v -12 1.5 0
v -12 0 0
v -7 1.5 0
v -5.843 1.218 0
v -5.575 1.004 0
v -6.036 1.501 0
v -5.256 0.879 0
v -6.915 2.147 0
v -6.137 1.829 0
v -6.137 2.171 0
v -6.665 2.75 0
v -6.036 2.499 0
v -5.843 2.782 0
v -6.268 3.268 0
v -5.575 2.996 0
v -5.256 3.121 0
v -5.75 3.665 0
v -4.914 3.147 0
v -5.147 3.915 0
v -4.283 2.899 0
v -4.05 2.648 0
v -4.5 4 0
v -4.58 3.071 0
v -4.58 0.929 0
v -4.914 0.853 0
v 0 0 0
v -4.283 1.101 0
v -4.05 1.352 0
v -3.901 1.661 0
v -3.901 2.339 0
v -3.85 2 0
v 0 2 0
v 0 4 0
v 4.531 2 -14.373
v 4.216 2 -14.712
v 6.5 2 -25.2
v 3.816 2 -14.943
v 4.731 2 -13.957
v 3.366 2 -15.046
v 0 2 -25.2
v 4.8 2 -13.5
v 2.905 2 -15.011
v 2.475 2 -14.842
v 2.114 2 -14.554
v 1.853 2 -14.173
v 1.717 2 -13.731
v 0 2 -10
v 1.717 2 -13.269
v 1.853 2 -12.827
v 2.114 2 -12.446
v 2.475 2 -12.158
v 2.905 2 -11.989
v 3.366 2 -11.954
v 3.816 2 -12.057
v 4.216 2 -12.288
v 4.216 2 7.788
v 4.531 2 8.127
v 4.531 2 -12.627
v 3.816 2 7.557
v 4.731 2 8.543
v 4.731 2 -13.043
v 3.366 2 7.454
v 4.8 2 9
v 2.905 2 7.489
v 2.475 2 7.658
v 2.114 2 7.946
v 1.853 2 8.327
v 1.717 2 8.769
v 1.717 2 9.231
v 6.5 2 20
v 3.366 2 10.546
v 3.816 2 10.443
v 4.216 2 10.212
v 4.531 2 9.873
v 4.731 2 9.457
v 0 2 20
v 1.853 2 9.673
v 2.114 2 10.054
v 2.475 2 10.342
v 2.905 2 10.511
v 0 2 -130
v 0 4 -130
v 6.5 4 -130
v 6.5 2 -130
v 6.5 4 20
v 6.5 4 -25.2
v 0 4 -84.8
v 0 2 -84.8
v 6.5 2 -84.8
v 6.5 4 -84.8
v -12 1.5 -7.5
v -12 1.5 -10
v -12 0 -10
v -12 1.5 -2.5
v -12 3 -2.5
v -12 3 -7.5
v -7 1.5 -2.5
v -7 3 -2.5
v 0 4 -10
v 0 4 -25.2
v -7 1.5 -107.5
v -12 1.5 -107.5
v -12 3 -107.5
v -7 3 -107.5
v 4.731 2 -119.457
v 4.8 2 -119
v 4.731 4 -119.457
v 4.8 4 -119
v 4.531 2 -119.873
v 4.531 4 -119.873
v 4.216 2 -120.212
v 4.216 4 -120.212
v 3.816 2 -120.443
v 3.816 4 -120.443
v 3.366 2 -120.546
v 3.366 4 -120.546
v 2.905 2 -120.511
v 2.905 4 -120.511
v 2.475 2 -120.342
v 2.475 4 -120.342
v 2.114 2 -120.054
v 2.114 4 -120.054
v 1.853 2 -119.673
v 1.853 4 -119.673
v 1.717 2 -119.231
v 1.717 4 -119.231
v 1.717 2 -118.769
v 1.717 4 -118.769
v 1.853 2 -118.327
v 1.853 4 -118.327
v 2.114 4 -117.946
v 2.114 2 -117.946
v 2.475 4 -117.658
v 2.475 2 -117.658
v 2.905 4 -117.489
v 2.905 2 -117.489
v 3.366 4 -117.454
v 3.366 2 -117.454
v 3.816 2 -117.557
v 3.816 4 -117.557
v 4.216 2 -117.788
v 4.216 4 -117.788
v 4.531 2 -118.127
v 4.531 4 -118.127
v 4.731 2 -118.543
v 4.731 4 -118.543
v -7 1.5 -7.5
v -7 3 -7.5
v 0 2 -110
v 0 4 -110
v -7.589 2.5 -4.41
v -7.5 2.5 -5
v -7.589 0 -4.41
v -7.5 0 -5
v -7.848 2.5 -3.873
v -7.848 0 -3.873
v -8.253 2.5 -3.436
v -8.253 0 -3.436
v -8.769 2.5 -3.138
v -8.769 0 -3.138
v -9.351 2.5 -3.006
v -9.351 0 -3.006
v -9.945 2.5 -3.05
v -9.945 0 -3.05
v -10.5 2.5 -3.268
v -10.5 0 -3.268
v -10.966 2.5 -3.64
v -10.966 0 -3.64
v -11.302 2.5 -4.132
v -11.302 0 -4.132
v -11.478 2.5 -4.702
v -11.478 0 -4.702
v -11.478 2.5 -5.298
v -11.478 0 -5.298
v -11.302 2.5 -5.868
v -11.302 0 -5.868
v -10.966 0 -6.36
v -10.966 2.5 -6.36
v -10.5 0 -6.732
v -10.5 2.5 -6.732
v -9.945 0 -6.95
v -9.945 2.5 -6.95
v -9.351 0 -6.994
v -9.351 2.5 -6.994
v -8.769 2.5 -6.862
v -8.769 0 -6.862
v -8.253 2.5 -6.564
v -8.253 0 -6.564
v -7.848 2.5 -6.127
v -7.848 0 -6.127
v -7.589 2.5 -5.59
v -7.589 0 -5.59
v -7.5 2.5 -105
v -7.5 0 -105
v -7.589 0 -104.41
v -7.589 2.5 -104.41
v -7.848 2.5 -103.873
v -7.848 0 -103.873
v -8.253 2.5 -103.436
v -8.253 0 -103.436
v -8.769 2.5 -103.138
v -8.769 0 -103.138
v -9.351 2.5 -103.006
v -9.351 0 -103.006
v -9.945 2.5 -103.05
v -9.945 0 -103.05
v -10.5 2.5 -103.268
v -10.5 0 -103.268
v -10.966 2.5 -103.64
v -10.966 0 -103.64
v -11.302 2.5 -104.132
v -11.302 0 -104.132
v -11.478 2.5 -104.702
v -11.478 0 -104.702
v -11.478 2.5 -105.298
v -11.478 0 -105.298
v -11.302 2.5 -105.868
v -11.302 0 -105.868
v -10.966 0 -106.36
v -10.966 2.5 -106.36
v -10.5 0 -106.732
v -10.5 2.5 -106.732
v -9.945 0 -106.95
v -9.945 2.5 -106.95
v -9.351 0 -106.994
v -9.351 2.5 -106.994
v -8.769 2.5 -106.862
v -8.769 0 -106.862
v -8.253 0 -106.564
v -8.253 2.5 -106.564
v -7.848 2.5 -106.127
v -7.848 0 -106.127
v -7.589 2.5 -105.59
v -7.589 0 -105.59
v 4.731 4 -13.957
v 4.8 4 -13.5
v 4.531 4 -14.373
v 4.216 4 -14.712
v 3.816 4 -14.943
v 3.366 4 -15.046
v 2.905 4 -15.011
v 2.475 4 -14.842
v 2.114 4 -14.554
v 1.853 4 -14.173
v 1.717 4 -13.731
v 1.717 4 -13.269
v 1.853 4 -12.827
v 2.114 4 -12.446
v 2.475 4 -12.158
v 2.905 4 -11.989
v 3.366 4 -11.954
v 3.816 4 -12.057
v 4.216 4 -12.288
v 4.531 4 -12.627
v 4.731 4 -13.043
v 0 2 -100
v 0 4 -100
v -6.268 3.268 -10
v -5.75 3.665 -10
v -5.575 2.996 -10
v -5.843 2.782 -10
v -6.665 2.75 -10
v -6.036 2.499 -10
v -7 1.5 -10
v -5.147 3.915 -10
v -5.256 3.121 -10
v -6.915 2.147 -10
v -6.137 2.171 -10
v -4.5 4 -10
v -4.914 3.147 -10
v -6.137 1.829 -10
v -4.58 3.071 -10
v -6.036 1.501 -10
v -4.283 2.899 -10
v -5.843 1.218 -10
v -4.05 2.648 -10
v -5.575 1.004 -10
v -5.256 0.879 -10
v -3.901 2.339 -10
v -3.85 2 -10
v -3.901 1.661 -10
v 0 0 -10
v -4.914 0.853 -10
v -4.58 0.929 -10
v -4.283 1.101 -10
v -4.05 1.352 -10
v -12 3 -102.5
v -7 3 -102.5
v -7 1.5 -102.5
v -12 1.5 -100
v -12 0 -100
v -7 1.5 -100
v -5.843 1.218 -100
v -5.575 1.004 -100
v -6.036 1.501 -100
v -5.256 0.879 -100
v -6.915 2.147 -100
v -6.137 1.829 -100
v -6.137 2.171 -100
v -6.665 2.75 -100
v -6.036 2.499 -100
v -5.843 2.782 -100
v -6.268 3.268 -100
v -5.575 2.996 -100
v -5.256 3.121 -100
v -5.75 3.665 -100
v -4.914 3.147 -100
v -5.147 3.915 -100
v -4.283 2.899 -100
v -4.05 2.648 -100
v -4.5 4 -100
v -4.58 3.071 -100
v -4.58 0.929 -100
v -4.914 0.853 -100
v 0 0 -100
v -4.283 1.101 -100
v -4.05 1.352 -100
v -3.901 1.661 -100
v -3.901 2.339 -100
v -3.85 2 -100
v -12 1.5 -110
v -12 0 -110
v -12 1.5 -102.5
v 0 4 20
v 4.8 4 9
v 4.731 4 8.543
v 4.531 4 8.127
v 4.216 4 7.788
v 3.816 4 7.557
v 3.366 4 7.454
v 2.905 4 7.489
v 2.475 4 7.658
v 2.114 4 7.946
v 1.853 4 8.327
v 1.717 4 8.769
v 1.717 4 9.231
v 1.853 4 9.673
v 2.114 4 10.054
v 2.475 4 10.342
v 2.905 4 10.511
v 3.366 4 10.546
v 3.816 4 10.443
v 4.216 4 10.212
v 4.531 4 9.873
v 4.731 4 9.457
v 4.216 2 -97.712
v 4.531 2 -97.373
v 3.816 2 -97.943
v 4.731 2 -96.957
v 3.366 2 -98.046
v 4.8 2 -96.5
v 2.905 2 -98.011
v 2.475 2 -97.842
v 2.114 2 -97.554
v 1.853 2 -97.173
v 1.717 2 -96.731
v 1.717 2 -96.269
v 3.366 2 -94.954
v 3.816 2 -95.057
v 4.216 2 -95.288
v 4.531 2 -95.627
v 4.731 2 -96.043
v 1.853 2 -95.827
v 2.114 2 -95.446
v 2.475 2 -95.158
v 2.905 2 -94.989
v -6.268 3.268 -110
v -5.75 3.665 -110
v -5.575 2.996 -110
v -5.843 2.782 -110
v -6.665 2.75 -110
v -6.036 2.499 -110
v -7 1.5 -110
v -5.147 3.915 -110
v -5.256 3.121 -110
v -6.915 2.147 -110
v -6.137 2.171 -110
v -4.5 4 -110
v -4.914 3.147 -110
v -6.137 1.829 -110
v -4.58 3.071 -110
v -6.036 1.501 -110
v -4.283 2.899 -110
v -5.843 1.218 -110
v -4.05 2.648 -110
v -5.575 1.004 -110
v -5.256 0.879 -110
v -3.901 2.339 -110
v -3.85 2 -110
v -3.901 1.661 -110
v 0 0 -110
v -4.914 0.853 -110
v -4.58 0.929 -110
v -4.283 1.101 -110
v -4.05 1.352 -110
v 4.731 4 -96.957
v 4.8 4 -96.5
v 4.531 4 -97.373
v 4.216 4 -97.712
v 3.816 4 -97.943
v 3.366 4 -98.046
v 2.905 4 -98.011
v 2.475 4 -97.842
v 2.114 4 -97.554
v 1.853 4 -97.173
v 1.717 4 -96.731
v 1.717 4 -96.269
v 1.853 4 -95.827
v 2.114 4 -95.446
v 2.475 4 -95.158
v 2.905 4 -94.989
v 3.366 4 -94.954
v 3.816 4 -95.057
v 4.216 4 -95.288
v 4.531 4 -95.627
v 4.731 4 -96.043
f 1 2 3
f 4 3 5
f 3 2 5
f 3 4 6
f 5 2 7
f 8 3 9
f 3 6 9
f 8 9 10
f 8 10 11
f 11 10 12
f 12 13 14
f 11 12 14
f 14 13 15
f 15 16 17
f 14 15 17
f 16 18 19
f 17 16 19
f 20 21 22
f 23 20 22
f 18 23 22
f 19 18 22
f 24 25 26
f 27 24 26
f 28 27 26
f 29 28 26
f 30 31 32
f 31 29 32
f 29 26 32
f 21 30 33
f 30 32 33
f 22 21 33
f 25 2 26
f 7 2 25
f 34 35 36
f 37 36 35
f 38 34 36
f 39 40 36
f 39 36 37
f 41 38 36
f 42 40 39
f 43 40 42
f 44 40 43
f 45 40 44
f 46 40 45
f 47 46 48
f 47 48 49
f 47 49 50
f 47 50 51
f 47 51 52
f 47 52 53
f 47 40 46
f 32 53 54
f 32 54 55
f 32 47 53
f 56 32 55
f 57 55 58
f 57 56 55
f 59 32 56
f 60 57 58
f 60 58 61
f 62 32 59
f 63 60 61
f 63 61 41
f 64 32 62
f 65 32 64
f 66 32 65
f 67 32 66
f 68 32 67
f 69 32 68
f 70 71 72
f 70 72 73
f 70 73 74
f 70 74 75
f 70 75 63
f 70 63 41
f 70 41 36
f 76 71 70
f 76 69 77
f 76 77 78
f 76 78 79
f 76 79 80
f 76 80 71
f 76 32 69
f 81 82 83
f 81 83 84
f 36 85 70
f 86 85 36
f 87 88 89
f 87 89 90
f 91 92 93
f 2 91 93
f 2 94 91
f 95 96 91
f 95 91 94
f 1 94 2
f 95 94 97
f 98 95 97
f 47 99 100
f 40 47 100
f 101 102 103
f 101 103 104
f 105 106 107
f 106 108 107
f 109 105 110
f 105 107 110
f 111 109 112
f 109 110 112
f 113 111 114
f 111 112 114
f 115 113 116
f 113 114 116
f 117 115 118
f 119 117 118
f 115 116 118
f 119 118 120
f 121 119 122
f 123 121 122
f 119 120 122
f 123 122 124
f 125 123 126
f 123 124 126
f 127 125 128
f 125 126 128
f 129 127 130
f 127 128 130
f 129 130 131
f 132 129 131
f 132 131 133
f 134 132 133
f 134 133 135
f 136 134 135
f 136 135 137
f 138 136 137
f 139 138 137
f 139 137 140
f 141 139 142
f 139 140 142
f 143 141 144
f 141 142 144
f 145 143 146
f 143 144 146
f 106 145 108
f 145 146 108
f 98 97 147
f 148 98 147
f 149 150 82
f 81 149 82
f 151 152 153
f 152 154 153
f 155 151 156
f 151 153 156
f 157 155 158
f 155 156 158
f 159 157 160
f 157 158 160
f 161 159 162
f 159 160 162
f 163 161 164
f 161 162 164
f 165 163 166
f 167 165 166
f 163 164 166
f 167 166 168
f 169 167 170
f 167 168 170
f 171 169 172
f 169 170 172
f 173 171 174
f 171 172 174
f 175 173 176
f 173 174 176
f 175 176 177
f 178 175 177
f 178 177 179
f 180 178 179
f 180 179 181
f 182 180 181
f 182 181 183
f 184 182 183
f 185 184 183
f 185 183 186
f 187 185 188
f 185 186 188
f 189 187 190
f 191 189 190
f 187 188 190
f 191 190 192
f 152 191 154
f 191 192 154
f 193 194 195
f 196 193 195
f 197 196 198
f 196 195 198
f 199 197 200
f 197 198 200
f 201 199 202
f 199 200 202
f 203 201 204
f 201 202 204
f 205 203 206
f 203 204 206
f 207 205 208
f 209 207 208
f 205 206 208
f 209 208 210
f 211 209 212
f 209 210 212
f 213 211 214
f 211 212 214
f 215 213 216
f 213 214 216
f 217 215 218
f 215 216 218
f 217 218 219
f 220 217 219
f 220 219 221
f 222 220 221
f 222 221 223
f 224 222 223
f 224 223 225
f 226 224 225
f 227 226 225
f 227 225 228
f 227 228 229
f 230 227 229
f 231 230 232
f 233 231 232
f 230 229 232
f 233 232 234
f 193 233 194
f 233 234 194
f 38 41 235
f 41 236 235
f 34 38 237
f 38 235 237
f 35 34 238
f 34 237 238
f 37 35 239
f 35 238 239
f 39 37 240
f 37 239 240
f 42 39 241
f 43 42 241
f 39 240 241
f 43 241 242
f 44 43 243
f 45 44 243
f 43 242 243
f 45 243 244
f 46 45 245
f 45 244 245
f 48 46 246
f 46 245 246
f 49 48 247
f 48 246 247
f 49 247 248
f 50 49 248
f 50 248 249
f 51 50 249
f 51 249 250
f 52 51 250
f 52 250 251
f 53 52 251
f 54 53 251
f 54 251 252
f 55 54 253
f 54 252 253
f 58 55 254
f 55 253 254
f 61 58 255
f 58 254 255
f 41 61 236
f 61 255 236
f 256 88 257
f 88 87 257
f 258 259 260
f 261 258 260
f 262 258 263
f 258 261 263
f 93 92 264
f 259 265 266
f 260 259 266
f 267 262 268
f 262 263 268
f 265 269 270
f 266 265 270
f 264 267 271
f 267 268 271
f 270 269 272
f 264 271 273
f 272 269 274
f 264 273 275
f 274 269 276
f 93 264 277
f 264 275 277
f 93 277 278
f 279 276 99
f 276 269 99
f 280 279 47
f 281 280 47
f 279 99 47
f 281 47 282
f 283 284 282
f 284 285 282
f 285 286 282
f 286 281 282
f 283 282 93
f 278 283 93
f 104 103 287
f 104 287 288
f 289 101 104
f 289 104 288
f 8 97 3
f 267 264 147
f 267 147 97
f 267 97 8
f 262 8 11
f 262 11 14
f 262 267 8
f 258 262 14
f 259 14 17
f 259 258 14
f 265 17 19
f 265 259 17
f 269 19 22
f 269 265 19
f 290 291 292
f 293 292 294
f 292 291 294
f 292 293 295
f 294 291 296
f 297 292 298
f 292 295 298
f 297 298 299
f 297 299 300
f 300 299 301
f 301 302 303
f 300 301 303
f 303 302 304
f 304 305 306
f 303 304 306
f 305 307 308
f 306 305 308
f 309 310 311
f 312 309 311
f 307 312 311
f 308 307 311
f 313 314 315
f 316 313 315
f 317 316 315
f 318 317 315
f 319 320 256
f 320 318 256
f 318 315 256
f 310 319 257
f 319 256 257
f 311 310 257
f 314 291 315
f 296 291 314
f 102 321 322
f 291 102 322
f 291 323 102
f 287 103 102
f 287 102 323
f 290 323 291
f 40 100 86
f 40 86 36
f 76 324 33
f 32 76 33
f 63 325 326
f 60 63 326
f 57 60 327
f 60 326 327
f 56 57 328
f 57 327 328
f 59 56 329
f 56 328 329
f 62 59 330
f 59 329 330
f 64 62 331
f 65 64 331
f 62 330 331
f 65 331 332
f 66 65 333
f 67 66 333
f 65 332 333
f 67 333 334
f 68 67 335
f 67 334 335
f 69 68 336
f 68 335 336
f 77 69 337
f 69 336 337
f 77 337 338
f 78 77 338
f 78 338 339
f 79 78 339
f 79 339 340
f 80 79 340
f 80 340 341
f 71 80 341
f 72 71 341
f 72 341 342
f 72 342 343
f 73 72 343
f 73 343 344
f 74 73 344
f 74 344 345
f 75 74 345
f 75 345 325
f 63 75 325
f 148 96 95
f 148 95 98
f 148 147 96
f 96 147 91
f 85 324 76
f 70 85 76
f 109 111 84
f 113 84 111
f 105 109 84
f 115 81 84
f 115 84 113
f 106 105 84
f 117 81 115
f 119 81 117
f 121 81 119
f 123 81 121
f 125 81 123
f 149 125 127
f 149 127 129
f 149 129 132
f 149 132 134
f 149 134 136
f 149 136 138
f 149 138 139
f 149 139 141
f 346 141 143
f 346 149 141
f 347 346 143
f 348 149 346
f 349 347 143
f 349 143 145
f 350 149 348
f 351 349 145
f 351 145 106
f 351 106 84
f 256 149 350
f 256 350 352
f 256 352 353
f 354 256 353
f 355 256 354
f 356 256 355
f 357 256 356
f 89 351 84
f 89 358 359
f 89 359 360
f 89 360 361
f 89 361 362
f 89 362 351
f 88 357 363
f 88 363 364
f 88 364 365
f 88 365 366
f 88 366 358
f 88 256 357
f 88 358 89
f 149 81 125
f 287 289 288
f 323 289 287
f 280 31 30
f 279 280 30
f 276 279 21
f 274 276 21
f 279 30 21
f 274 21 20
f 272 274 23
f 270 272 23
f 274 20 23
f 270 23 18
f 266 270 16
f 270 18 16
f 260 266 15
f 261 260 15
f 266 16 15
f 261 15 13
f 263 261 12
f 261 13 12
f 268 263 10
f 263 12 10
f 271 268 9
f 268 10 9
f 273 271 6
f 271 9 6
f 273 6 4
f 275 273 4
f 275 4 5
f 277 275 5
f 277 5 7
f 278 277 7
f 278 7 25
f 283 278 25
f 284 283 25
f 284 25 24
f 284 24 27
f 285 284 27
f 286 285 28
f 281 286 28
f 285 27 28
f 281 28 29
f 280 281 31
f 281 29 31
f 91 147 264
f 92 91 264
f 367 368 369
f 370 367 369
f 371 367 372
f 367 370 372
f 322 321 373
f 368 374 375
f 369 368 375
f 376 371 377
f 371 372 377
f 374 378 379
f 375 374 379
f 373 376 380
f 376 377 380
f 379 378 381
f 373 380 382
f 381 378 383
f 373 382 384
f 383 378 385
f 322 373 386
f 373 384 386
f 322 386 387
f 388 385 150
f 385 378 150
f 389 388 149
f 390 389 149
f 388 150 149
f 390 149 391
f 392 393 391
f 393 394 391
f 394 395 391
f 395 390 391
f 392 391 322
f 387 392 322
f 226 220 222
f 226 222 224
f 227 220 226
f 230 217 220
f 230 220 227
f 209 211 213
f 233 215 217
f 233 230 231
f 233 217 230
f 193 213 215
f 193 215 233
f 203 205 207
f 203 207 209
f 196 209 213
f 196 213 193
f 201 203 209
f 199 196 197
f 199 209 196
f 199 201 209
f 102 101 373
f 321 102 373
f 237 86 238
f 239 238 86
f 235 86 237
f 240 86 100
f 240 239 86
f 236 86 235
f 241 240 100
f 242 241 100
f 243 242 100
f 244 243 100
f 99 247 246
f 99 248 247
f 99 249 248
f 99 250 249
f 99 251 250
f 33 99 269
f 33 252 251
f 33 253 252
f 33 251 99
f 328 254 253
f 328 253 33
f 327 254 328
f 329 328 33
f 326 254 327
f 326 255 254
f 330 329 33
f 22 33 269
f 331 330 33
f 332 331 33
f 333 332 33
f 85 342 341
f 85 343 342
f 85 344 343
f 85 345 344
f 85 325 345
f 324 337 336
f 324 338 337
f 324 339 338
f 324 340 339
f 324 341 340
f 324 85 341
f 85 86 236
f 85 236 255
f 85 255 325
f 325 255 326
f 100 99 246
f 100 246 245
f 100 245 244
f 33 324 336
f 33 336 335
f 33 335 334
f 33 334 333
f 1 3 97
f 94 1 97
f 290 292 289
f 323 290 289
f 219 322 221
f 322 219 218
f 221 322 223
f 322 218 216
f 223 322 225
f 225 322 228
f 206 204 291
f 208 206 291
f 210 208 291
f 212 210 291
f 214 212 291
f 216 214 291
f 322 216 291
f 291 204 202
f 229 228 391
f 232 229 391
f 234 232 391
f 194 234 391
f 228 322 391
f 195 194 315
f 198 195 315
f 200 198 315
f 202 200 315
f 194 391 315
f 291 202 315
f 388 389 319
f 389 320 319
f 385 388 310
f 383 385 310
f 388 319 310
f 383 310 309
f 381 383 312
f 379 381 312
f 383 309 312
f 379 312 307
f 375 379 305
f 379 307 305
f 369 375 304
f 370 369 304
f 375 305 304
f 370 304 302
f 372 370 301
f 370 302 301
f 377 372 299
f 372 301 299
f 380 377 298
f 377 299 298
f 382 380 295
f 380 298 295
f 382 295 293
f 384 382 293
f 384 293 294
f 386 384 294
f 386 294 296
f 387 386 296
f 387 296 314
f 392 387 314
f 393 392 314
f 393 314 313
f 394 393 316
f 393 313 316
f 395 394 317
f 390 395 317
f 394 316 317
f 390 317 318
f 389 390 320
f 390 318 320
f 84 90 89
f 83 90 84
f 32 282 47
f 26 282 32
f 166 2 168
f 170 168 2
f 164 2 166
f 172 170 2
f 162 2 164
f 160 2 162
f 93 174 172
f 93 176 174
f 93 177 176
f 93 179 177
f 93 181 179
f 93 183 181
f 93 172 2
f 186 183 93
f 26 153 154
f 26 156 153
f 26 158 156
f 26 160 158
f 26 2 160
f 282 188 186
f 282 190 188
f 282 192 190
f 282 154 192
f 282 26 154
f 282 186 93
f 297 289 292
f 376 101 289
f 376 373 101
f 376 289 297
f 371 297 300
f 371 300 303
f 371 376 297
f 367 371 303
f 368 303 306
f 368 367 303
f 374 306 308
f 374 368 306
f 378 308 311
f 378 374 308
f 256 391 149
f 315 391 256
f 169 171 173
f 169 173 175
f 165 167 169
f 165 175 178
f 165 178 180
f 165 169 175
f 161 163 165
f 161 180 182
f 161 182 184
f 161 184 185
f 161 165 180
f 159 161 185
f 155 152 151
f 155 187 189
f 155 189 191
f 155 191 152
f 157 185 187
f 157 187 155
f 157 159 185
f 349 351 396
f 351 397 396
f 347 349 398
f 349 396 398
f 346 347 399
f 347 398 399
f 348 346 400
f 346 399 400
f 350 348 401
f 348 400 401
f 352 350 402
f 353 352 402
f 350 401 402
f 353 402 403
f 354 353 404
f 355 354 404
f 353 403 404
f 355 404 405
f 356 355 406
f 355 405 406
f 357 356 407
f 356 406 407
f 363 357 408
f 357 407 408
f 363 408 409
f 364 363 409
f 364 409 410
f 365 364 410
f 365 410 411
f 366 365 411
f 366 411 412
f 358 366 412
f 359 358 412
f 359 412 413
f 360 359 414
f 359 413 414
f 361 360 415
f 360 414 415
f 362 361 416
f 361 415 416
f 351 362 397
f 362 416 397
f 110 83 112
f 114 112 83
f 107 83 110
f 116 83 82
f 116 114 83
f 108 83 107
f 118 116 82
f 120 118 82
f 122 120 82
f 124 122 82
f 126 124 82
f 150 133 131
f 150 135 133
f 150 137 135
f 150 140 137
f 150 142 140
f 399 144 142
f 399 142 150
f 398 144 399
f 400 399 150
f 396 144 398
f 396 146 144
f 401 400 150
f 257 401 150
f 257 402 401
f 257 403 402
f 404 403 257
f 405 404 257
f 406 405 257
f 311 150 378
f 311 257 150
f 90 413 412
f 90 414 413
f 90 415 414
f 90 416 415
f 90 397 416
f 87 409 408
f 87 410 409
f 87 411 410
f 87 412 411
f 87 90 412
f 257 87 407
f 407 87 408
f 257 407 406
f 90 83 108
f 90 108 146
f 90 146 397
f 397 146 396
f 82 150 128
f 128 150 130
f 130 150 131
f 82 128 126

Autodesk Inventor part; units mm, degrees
ref_plane "YZ Plane" through (0, 0, 0) normal (1, 0, 0) x (0, 1, 0)
ref_plane "XZ Plane" through (0, 0, 0) normal (0, 1, 0) x (-1, 0, 0)
ref_plane "XY Plane" through (0, 0, 0) normal (0, 0, 1) x (1, 0, 0)
sketch "Sketch21" plane through (0, 0, 0) normal (0, 1, 0) x (-1, 0, 0)
  line L0 (0, 0) -> (7, 0)
  line L1 (7, 0) -> (7, -10)
  line L2 (7, -10) -> (0, -10)
  line L3 (0, -10) -> (0, 0)
  line L4 (0, -100) -> (7, -100)
  line L5 (7, -100) -> (7, -110)
  line L6 (7, -110) -> (0, -110)
  line L7 (0, -110) -> (0, -100)
  dimension "d144" = 7
  dimension "d145" = 10
  dimension "d146" = 7
  dimension "d147" = 10
  dimension "d148" = 90
extrude "Extrusion19" add sketch "Sketch21" along normal blind 4
sketch "Sketch22" plane through (0, 0, 0) normal (1, 0, 0) x (0, 0, -1)
  line L0 (10, 4) -> (0, 4) projected
  line L1 (10, 0) -> (10, 4) projected
  line L2 (0, 4) -> (10, 4)
  line L3 (10, 4) -> (10, 2)
  line L4 (10, 2) -> (0, 2)
  line L5 (0, 2) -> (0, 4)
  line L6 (10, 4) -> (25.2, 4)
  line L7 (25.2, 4) -> (25.2, 2)
  line L8 (25.2, 2) -> (10, 2)
  line L9 (10, 2) -> (10, 4)
  line L10 (0, 4) -> (-20, 4)
  line L11 (-20, 4) -> (-20, 2)
  line L12 (-20, 2) -> (0, 2)
  line L13 (0, 2) -> (0, 4)
  line L14 (110, 0) -> (110, 4) projected
  line L15 (100, 4) -> (110, 4)
  line L16 (110, 4) -> (110, 2)
  line L17 (110, 2) -> (100, 2)
  line L18 (100, 2) -> (100, 4)
  line L19 (100, 2) -> (84.8, 2)
  line L20 (84.8, 2) -> (84.8, 4)
  line L21 (84.8, 4) -> (100, 4)
  line L22 (100, 4) -> (100, 2)
  line L23 (110, 4) -> (130, 4)
  line L24 (130, 4) -> (130, 2)
  line L25 (130, 2) -> (110, 2)
  line L26 (110, 2) -> (110, 4)
  point P0 (0, 0)
  point P1 (10, 3)
  point P2 (0, 3)
  dimension "d151" = 10
  dimension "d152" = 15.2
  dimension "d153" = 20
  dimension "d154" = 15.2
  dimension "d155" = 20
extrude "Extrusion20" add sketch "Sketch22" along normal blind 6.5
sketch "Sketch23" plane through (0, 4, 0) normal (0, 1, 0) x (1, 0, 0)
  point P0 (0, 0)
sketch "Sketch24" plane through (0, 4, 0) normal (0, 1, 0) x (1, 0, 0)
  circle A0 centre (3.25, -9) radius 1.55
  circle A1 centre (3.25, 13.5) radius 1.55
  line L0 (0, -20) -> (6.5, -20) projected
  line L1 (0, 0) -> (0, -20) projected
  line L2 (0, 25.2) -> (0, 10) projected
  circle A2 centre (3.25, 96.5) radius 1.55
  circle A3 centre (3.25, 119) radius 1.55
  line L3 (0, 130) -> (0, 110) projected
  line L4 (0, 130) -> (6.5, 130) projected
  point P0 (3.25, -20)
  point P1 (3.25, -20)
  point P2 (3.25, 130)
  point P3 (3.25, 130)
  dimension "d158" = 3.1
  dimension "d159" = 3.1
  dimension "d160" = 11
  dimension "d161" = 33.5
  dimension "d162" = 3.25
  dimension "d163" = 3.25
  dimension "d164" = 3.1
  dimension "d165" = 3.1
  dimension "d166" = 3.25
  dimension "d167" = 11
  dimension "d169" = 33.5
  dimension "d170" = 3.25
extrude "Extrusion21" cut sketch "Sketch24" against normal blind 2
sketch "Sketch25" plane through (-7, 0, 0) normal (0, 0, 1) x (1, 0, 0)
  circle A0 centre (2, 2) radius 1.15
  line L0 (0, 0) -> (0, 4) projected
  line L1 (0, 4) -> (7, 4) projected
  point P0 (7, 0)
  point P1 (0, 2)
  dimension "d173" = 2.3
  dimension "d174" = 2
  dimension "d175" = 2
extrude "Extrusion22" cut sketch "Sketch25" against normal blind 90
sketch "Szkic26" plane through (0, 0, -100) normal (0, 0, 1) x (1, 0, 0)
  line L0 (0, 2) -> (6.5, 2) projected
  circle A0 centre (-5, 2) radius 1.15 projected
  point P0 (0, 0)
extrude "Wyciągnięcie proste23" cut sketch "Szkic26" against normal blind 10
sketch "Szkic31" plane through (-7, 0, -110) normal (-1, 0, 0) x (0, 0, 1)
  line L0 (110, 0) -> (100, 0) projected
  line L1 (110, 3.15) -> (110, 0.85) projected
  line L2 (100, 0) -> (110, 0)
  line L3 (110, 0) -> (110, 1.5)
  line L4 (110, 1.5) -> (100, 1.5)
  line L5 (100, 1.5) -> (100, 0)
  dimension "d201" = 1.5
extrude "Wyciągnięcie proste28" add sketch "Szkic31" along normal blind 5
fillet "Zaokrąglenie6" radius 2.5 1 edges at (-7, 4, -5)
sketch "Szkic32" plane through (-7, 0, -110) normal (-1, 0, 0) x (0, 0, 1)
  line L0 (0, 0) -> (10, 0)
  line L1 (10, 0) -> (10, 1.5)
  line L2 (10, 1.5) -> (0, 1.5)
  line L3 (0, 1.5) -> (0, 0)
  point P0 (110, 0)
  dimension "d205" = 10
  dimension "d206" = 1.5
extrude "Wyciągnięcie proste29" add sketch "Szkic32" along normal blind 5
fillet "Zaokrąglenie7" radius 2.5 1 edges at (-7, 4, -105)
sketch "Szkic33" plane through (-12, 1.5, -100) normal (0, 1, 0) x (1, 0, 0)
  circle A0 centre (2.5, 5) radius 2
  circle A1 centre (2.5, -95) radius 2
  line L0 (0, -100) -> (0, -90) projected
  line L1 (5, -100) -> (0, -100) projected
  line L2 (5, 0) -> (0, 0) projected
  line L3 (0, 0) -> (0, 10) projected
  line L4 (5, 2.5) -> (0, 2.5)
  line L5 (0, 2.5) -> (0, 7.5)
  line L6 (0, 7.5) -> (5, 7.5)
  line L7 (5, 7.5) -> (5, 2.5)
  line L8 (5, 2.5) -> (0, 7.5) construction
  line L9 (0, 2.5) -> (5, 7.5) construction
  line L10 (5, -92.5) -> (0, -92.5)
  line L11 (0, -92.5) -> (0, -97.5)
  line L12 (0, -97.5) -> (5, -97.5)
  line L13 (5, -97.5) -> (5, -92.5)
  line L14 (5, -92.5) -> (0, -97.5) construction
  line L15 (0, -92.5) -> (5, -97.5) construction
  point P0 (12, -100)
  point P1 (2.5, -100)
  point P2 (2.5, 0)
  dimension "d210" = 4
  dimension "d211" = 4
  dimension "d212" = 2.5
  dimension "d213" = 5
  dimension "d214" = 5
  dimension "d215" = 2.5
  dimension "d216" = 5
  dimension "d217" = 5
extrude "Wyciągnięcie proste30" add sketch "Szkic33" along normal blind 1.5 contours A0 | A1 | L0 L10 L13 L12 | L3 L6 L7 L4
sketch "Szkic34" plane through (0, 0, 0) normal (0, -1, 0) x (1, 0, 0)
  line L0 (0, -10) -> (-12, -10) projected
  line L1 (0, 0) -> (0, -10) projected
  line L2 (0, 0) -> (-12, 0) projected
  line L3 (-12, -10) -> (-12, 0) projected
  circle A0 centre (-9.5, -5) radius 2
  circle A1 centre (-9.5, -105) radius 2
  line L4 (-12, -110) -> (-12, -100) projected
  line L5 (0, -100) -> (-12, -100) projected
  point P0 (-12, -5)
  point P1 (-12, -105)
  dimension "d220" = 4
  dimension "d221" = 2.5
  dimension "d222" = 5
  dimension "d223" = 4
  dimension "d224" = 2.5
  dimension "d225" = 5
extrude "Wyciągnięcie proste31" cut sketch "Szkic34" against normal blind 2.5 contours A0 | A1
properties part number "mocowanie do pługu" material "Tworzywo sztuczne PET"
